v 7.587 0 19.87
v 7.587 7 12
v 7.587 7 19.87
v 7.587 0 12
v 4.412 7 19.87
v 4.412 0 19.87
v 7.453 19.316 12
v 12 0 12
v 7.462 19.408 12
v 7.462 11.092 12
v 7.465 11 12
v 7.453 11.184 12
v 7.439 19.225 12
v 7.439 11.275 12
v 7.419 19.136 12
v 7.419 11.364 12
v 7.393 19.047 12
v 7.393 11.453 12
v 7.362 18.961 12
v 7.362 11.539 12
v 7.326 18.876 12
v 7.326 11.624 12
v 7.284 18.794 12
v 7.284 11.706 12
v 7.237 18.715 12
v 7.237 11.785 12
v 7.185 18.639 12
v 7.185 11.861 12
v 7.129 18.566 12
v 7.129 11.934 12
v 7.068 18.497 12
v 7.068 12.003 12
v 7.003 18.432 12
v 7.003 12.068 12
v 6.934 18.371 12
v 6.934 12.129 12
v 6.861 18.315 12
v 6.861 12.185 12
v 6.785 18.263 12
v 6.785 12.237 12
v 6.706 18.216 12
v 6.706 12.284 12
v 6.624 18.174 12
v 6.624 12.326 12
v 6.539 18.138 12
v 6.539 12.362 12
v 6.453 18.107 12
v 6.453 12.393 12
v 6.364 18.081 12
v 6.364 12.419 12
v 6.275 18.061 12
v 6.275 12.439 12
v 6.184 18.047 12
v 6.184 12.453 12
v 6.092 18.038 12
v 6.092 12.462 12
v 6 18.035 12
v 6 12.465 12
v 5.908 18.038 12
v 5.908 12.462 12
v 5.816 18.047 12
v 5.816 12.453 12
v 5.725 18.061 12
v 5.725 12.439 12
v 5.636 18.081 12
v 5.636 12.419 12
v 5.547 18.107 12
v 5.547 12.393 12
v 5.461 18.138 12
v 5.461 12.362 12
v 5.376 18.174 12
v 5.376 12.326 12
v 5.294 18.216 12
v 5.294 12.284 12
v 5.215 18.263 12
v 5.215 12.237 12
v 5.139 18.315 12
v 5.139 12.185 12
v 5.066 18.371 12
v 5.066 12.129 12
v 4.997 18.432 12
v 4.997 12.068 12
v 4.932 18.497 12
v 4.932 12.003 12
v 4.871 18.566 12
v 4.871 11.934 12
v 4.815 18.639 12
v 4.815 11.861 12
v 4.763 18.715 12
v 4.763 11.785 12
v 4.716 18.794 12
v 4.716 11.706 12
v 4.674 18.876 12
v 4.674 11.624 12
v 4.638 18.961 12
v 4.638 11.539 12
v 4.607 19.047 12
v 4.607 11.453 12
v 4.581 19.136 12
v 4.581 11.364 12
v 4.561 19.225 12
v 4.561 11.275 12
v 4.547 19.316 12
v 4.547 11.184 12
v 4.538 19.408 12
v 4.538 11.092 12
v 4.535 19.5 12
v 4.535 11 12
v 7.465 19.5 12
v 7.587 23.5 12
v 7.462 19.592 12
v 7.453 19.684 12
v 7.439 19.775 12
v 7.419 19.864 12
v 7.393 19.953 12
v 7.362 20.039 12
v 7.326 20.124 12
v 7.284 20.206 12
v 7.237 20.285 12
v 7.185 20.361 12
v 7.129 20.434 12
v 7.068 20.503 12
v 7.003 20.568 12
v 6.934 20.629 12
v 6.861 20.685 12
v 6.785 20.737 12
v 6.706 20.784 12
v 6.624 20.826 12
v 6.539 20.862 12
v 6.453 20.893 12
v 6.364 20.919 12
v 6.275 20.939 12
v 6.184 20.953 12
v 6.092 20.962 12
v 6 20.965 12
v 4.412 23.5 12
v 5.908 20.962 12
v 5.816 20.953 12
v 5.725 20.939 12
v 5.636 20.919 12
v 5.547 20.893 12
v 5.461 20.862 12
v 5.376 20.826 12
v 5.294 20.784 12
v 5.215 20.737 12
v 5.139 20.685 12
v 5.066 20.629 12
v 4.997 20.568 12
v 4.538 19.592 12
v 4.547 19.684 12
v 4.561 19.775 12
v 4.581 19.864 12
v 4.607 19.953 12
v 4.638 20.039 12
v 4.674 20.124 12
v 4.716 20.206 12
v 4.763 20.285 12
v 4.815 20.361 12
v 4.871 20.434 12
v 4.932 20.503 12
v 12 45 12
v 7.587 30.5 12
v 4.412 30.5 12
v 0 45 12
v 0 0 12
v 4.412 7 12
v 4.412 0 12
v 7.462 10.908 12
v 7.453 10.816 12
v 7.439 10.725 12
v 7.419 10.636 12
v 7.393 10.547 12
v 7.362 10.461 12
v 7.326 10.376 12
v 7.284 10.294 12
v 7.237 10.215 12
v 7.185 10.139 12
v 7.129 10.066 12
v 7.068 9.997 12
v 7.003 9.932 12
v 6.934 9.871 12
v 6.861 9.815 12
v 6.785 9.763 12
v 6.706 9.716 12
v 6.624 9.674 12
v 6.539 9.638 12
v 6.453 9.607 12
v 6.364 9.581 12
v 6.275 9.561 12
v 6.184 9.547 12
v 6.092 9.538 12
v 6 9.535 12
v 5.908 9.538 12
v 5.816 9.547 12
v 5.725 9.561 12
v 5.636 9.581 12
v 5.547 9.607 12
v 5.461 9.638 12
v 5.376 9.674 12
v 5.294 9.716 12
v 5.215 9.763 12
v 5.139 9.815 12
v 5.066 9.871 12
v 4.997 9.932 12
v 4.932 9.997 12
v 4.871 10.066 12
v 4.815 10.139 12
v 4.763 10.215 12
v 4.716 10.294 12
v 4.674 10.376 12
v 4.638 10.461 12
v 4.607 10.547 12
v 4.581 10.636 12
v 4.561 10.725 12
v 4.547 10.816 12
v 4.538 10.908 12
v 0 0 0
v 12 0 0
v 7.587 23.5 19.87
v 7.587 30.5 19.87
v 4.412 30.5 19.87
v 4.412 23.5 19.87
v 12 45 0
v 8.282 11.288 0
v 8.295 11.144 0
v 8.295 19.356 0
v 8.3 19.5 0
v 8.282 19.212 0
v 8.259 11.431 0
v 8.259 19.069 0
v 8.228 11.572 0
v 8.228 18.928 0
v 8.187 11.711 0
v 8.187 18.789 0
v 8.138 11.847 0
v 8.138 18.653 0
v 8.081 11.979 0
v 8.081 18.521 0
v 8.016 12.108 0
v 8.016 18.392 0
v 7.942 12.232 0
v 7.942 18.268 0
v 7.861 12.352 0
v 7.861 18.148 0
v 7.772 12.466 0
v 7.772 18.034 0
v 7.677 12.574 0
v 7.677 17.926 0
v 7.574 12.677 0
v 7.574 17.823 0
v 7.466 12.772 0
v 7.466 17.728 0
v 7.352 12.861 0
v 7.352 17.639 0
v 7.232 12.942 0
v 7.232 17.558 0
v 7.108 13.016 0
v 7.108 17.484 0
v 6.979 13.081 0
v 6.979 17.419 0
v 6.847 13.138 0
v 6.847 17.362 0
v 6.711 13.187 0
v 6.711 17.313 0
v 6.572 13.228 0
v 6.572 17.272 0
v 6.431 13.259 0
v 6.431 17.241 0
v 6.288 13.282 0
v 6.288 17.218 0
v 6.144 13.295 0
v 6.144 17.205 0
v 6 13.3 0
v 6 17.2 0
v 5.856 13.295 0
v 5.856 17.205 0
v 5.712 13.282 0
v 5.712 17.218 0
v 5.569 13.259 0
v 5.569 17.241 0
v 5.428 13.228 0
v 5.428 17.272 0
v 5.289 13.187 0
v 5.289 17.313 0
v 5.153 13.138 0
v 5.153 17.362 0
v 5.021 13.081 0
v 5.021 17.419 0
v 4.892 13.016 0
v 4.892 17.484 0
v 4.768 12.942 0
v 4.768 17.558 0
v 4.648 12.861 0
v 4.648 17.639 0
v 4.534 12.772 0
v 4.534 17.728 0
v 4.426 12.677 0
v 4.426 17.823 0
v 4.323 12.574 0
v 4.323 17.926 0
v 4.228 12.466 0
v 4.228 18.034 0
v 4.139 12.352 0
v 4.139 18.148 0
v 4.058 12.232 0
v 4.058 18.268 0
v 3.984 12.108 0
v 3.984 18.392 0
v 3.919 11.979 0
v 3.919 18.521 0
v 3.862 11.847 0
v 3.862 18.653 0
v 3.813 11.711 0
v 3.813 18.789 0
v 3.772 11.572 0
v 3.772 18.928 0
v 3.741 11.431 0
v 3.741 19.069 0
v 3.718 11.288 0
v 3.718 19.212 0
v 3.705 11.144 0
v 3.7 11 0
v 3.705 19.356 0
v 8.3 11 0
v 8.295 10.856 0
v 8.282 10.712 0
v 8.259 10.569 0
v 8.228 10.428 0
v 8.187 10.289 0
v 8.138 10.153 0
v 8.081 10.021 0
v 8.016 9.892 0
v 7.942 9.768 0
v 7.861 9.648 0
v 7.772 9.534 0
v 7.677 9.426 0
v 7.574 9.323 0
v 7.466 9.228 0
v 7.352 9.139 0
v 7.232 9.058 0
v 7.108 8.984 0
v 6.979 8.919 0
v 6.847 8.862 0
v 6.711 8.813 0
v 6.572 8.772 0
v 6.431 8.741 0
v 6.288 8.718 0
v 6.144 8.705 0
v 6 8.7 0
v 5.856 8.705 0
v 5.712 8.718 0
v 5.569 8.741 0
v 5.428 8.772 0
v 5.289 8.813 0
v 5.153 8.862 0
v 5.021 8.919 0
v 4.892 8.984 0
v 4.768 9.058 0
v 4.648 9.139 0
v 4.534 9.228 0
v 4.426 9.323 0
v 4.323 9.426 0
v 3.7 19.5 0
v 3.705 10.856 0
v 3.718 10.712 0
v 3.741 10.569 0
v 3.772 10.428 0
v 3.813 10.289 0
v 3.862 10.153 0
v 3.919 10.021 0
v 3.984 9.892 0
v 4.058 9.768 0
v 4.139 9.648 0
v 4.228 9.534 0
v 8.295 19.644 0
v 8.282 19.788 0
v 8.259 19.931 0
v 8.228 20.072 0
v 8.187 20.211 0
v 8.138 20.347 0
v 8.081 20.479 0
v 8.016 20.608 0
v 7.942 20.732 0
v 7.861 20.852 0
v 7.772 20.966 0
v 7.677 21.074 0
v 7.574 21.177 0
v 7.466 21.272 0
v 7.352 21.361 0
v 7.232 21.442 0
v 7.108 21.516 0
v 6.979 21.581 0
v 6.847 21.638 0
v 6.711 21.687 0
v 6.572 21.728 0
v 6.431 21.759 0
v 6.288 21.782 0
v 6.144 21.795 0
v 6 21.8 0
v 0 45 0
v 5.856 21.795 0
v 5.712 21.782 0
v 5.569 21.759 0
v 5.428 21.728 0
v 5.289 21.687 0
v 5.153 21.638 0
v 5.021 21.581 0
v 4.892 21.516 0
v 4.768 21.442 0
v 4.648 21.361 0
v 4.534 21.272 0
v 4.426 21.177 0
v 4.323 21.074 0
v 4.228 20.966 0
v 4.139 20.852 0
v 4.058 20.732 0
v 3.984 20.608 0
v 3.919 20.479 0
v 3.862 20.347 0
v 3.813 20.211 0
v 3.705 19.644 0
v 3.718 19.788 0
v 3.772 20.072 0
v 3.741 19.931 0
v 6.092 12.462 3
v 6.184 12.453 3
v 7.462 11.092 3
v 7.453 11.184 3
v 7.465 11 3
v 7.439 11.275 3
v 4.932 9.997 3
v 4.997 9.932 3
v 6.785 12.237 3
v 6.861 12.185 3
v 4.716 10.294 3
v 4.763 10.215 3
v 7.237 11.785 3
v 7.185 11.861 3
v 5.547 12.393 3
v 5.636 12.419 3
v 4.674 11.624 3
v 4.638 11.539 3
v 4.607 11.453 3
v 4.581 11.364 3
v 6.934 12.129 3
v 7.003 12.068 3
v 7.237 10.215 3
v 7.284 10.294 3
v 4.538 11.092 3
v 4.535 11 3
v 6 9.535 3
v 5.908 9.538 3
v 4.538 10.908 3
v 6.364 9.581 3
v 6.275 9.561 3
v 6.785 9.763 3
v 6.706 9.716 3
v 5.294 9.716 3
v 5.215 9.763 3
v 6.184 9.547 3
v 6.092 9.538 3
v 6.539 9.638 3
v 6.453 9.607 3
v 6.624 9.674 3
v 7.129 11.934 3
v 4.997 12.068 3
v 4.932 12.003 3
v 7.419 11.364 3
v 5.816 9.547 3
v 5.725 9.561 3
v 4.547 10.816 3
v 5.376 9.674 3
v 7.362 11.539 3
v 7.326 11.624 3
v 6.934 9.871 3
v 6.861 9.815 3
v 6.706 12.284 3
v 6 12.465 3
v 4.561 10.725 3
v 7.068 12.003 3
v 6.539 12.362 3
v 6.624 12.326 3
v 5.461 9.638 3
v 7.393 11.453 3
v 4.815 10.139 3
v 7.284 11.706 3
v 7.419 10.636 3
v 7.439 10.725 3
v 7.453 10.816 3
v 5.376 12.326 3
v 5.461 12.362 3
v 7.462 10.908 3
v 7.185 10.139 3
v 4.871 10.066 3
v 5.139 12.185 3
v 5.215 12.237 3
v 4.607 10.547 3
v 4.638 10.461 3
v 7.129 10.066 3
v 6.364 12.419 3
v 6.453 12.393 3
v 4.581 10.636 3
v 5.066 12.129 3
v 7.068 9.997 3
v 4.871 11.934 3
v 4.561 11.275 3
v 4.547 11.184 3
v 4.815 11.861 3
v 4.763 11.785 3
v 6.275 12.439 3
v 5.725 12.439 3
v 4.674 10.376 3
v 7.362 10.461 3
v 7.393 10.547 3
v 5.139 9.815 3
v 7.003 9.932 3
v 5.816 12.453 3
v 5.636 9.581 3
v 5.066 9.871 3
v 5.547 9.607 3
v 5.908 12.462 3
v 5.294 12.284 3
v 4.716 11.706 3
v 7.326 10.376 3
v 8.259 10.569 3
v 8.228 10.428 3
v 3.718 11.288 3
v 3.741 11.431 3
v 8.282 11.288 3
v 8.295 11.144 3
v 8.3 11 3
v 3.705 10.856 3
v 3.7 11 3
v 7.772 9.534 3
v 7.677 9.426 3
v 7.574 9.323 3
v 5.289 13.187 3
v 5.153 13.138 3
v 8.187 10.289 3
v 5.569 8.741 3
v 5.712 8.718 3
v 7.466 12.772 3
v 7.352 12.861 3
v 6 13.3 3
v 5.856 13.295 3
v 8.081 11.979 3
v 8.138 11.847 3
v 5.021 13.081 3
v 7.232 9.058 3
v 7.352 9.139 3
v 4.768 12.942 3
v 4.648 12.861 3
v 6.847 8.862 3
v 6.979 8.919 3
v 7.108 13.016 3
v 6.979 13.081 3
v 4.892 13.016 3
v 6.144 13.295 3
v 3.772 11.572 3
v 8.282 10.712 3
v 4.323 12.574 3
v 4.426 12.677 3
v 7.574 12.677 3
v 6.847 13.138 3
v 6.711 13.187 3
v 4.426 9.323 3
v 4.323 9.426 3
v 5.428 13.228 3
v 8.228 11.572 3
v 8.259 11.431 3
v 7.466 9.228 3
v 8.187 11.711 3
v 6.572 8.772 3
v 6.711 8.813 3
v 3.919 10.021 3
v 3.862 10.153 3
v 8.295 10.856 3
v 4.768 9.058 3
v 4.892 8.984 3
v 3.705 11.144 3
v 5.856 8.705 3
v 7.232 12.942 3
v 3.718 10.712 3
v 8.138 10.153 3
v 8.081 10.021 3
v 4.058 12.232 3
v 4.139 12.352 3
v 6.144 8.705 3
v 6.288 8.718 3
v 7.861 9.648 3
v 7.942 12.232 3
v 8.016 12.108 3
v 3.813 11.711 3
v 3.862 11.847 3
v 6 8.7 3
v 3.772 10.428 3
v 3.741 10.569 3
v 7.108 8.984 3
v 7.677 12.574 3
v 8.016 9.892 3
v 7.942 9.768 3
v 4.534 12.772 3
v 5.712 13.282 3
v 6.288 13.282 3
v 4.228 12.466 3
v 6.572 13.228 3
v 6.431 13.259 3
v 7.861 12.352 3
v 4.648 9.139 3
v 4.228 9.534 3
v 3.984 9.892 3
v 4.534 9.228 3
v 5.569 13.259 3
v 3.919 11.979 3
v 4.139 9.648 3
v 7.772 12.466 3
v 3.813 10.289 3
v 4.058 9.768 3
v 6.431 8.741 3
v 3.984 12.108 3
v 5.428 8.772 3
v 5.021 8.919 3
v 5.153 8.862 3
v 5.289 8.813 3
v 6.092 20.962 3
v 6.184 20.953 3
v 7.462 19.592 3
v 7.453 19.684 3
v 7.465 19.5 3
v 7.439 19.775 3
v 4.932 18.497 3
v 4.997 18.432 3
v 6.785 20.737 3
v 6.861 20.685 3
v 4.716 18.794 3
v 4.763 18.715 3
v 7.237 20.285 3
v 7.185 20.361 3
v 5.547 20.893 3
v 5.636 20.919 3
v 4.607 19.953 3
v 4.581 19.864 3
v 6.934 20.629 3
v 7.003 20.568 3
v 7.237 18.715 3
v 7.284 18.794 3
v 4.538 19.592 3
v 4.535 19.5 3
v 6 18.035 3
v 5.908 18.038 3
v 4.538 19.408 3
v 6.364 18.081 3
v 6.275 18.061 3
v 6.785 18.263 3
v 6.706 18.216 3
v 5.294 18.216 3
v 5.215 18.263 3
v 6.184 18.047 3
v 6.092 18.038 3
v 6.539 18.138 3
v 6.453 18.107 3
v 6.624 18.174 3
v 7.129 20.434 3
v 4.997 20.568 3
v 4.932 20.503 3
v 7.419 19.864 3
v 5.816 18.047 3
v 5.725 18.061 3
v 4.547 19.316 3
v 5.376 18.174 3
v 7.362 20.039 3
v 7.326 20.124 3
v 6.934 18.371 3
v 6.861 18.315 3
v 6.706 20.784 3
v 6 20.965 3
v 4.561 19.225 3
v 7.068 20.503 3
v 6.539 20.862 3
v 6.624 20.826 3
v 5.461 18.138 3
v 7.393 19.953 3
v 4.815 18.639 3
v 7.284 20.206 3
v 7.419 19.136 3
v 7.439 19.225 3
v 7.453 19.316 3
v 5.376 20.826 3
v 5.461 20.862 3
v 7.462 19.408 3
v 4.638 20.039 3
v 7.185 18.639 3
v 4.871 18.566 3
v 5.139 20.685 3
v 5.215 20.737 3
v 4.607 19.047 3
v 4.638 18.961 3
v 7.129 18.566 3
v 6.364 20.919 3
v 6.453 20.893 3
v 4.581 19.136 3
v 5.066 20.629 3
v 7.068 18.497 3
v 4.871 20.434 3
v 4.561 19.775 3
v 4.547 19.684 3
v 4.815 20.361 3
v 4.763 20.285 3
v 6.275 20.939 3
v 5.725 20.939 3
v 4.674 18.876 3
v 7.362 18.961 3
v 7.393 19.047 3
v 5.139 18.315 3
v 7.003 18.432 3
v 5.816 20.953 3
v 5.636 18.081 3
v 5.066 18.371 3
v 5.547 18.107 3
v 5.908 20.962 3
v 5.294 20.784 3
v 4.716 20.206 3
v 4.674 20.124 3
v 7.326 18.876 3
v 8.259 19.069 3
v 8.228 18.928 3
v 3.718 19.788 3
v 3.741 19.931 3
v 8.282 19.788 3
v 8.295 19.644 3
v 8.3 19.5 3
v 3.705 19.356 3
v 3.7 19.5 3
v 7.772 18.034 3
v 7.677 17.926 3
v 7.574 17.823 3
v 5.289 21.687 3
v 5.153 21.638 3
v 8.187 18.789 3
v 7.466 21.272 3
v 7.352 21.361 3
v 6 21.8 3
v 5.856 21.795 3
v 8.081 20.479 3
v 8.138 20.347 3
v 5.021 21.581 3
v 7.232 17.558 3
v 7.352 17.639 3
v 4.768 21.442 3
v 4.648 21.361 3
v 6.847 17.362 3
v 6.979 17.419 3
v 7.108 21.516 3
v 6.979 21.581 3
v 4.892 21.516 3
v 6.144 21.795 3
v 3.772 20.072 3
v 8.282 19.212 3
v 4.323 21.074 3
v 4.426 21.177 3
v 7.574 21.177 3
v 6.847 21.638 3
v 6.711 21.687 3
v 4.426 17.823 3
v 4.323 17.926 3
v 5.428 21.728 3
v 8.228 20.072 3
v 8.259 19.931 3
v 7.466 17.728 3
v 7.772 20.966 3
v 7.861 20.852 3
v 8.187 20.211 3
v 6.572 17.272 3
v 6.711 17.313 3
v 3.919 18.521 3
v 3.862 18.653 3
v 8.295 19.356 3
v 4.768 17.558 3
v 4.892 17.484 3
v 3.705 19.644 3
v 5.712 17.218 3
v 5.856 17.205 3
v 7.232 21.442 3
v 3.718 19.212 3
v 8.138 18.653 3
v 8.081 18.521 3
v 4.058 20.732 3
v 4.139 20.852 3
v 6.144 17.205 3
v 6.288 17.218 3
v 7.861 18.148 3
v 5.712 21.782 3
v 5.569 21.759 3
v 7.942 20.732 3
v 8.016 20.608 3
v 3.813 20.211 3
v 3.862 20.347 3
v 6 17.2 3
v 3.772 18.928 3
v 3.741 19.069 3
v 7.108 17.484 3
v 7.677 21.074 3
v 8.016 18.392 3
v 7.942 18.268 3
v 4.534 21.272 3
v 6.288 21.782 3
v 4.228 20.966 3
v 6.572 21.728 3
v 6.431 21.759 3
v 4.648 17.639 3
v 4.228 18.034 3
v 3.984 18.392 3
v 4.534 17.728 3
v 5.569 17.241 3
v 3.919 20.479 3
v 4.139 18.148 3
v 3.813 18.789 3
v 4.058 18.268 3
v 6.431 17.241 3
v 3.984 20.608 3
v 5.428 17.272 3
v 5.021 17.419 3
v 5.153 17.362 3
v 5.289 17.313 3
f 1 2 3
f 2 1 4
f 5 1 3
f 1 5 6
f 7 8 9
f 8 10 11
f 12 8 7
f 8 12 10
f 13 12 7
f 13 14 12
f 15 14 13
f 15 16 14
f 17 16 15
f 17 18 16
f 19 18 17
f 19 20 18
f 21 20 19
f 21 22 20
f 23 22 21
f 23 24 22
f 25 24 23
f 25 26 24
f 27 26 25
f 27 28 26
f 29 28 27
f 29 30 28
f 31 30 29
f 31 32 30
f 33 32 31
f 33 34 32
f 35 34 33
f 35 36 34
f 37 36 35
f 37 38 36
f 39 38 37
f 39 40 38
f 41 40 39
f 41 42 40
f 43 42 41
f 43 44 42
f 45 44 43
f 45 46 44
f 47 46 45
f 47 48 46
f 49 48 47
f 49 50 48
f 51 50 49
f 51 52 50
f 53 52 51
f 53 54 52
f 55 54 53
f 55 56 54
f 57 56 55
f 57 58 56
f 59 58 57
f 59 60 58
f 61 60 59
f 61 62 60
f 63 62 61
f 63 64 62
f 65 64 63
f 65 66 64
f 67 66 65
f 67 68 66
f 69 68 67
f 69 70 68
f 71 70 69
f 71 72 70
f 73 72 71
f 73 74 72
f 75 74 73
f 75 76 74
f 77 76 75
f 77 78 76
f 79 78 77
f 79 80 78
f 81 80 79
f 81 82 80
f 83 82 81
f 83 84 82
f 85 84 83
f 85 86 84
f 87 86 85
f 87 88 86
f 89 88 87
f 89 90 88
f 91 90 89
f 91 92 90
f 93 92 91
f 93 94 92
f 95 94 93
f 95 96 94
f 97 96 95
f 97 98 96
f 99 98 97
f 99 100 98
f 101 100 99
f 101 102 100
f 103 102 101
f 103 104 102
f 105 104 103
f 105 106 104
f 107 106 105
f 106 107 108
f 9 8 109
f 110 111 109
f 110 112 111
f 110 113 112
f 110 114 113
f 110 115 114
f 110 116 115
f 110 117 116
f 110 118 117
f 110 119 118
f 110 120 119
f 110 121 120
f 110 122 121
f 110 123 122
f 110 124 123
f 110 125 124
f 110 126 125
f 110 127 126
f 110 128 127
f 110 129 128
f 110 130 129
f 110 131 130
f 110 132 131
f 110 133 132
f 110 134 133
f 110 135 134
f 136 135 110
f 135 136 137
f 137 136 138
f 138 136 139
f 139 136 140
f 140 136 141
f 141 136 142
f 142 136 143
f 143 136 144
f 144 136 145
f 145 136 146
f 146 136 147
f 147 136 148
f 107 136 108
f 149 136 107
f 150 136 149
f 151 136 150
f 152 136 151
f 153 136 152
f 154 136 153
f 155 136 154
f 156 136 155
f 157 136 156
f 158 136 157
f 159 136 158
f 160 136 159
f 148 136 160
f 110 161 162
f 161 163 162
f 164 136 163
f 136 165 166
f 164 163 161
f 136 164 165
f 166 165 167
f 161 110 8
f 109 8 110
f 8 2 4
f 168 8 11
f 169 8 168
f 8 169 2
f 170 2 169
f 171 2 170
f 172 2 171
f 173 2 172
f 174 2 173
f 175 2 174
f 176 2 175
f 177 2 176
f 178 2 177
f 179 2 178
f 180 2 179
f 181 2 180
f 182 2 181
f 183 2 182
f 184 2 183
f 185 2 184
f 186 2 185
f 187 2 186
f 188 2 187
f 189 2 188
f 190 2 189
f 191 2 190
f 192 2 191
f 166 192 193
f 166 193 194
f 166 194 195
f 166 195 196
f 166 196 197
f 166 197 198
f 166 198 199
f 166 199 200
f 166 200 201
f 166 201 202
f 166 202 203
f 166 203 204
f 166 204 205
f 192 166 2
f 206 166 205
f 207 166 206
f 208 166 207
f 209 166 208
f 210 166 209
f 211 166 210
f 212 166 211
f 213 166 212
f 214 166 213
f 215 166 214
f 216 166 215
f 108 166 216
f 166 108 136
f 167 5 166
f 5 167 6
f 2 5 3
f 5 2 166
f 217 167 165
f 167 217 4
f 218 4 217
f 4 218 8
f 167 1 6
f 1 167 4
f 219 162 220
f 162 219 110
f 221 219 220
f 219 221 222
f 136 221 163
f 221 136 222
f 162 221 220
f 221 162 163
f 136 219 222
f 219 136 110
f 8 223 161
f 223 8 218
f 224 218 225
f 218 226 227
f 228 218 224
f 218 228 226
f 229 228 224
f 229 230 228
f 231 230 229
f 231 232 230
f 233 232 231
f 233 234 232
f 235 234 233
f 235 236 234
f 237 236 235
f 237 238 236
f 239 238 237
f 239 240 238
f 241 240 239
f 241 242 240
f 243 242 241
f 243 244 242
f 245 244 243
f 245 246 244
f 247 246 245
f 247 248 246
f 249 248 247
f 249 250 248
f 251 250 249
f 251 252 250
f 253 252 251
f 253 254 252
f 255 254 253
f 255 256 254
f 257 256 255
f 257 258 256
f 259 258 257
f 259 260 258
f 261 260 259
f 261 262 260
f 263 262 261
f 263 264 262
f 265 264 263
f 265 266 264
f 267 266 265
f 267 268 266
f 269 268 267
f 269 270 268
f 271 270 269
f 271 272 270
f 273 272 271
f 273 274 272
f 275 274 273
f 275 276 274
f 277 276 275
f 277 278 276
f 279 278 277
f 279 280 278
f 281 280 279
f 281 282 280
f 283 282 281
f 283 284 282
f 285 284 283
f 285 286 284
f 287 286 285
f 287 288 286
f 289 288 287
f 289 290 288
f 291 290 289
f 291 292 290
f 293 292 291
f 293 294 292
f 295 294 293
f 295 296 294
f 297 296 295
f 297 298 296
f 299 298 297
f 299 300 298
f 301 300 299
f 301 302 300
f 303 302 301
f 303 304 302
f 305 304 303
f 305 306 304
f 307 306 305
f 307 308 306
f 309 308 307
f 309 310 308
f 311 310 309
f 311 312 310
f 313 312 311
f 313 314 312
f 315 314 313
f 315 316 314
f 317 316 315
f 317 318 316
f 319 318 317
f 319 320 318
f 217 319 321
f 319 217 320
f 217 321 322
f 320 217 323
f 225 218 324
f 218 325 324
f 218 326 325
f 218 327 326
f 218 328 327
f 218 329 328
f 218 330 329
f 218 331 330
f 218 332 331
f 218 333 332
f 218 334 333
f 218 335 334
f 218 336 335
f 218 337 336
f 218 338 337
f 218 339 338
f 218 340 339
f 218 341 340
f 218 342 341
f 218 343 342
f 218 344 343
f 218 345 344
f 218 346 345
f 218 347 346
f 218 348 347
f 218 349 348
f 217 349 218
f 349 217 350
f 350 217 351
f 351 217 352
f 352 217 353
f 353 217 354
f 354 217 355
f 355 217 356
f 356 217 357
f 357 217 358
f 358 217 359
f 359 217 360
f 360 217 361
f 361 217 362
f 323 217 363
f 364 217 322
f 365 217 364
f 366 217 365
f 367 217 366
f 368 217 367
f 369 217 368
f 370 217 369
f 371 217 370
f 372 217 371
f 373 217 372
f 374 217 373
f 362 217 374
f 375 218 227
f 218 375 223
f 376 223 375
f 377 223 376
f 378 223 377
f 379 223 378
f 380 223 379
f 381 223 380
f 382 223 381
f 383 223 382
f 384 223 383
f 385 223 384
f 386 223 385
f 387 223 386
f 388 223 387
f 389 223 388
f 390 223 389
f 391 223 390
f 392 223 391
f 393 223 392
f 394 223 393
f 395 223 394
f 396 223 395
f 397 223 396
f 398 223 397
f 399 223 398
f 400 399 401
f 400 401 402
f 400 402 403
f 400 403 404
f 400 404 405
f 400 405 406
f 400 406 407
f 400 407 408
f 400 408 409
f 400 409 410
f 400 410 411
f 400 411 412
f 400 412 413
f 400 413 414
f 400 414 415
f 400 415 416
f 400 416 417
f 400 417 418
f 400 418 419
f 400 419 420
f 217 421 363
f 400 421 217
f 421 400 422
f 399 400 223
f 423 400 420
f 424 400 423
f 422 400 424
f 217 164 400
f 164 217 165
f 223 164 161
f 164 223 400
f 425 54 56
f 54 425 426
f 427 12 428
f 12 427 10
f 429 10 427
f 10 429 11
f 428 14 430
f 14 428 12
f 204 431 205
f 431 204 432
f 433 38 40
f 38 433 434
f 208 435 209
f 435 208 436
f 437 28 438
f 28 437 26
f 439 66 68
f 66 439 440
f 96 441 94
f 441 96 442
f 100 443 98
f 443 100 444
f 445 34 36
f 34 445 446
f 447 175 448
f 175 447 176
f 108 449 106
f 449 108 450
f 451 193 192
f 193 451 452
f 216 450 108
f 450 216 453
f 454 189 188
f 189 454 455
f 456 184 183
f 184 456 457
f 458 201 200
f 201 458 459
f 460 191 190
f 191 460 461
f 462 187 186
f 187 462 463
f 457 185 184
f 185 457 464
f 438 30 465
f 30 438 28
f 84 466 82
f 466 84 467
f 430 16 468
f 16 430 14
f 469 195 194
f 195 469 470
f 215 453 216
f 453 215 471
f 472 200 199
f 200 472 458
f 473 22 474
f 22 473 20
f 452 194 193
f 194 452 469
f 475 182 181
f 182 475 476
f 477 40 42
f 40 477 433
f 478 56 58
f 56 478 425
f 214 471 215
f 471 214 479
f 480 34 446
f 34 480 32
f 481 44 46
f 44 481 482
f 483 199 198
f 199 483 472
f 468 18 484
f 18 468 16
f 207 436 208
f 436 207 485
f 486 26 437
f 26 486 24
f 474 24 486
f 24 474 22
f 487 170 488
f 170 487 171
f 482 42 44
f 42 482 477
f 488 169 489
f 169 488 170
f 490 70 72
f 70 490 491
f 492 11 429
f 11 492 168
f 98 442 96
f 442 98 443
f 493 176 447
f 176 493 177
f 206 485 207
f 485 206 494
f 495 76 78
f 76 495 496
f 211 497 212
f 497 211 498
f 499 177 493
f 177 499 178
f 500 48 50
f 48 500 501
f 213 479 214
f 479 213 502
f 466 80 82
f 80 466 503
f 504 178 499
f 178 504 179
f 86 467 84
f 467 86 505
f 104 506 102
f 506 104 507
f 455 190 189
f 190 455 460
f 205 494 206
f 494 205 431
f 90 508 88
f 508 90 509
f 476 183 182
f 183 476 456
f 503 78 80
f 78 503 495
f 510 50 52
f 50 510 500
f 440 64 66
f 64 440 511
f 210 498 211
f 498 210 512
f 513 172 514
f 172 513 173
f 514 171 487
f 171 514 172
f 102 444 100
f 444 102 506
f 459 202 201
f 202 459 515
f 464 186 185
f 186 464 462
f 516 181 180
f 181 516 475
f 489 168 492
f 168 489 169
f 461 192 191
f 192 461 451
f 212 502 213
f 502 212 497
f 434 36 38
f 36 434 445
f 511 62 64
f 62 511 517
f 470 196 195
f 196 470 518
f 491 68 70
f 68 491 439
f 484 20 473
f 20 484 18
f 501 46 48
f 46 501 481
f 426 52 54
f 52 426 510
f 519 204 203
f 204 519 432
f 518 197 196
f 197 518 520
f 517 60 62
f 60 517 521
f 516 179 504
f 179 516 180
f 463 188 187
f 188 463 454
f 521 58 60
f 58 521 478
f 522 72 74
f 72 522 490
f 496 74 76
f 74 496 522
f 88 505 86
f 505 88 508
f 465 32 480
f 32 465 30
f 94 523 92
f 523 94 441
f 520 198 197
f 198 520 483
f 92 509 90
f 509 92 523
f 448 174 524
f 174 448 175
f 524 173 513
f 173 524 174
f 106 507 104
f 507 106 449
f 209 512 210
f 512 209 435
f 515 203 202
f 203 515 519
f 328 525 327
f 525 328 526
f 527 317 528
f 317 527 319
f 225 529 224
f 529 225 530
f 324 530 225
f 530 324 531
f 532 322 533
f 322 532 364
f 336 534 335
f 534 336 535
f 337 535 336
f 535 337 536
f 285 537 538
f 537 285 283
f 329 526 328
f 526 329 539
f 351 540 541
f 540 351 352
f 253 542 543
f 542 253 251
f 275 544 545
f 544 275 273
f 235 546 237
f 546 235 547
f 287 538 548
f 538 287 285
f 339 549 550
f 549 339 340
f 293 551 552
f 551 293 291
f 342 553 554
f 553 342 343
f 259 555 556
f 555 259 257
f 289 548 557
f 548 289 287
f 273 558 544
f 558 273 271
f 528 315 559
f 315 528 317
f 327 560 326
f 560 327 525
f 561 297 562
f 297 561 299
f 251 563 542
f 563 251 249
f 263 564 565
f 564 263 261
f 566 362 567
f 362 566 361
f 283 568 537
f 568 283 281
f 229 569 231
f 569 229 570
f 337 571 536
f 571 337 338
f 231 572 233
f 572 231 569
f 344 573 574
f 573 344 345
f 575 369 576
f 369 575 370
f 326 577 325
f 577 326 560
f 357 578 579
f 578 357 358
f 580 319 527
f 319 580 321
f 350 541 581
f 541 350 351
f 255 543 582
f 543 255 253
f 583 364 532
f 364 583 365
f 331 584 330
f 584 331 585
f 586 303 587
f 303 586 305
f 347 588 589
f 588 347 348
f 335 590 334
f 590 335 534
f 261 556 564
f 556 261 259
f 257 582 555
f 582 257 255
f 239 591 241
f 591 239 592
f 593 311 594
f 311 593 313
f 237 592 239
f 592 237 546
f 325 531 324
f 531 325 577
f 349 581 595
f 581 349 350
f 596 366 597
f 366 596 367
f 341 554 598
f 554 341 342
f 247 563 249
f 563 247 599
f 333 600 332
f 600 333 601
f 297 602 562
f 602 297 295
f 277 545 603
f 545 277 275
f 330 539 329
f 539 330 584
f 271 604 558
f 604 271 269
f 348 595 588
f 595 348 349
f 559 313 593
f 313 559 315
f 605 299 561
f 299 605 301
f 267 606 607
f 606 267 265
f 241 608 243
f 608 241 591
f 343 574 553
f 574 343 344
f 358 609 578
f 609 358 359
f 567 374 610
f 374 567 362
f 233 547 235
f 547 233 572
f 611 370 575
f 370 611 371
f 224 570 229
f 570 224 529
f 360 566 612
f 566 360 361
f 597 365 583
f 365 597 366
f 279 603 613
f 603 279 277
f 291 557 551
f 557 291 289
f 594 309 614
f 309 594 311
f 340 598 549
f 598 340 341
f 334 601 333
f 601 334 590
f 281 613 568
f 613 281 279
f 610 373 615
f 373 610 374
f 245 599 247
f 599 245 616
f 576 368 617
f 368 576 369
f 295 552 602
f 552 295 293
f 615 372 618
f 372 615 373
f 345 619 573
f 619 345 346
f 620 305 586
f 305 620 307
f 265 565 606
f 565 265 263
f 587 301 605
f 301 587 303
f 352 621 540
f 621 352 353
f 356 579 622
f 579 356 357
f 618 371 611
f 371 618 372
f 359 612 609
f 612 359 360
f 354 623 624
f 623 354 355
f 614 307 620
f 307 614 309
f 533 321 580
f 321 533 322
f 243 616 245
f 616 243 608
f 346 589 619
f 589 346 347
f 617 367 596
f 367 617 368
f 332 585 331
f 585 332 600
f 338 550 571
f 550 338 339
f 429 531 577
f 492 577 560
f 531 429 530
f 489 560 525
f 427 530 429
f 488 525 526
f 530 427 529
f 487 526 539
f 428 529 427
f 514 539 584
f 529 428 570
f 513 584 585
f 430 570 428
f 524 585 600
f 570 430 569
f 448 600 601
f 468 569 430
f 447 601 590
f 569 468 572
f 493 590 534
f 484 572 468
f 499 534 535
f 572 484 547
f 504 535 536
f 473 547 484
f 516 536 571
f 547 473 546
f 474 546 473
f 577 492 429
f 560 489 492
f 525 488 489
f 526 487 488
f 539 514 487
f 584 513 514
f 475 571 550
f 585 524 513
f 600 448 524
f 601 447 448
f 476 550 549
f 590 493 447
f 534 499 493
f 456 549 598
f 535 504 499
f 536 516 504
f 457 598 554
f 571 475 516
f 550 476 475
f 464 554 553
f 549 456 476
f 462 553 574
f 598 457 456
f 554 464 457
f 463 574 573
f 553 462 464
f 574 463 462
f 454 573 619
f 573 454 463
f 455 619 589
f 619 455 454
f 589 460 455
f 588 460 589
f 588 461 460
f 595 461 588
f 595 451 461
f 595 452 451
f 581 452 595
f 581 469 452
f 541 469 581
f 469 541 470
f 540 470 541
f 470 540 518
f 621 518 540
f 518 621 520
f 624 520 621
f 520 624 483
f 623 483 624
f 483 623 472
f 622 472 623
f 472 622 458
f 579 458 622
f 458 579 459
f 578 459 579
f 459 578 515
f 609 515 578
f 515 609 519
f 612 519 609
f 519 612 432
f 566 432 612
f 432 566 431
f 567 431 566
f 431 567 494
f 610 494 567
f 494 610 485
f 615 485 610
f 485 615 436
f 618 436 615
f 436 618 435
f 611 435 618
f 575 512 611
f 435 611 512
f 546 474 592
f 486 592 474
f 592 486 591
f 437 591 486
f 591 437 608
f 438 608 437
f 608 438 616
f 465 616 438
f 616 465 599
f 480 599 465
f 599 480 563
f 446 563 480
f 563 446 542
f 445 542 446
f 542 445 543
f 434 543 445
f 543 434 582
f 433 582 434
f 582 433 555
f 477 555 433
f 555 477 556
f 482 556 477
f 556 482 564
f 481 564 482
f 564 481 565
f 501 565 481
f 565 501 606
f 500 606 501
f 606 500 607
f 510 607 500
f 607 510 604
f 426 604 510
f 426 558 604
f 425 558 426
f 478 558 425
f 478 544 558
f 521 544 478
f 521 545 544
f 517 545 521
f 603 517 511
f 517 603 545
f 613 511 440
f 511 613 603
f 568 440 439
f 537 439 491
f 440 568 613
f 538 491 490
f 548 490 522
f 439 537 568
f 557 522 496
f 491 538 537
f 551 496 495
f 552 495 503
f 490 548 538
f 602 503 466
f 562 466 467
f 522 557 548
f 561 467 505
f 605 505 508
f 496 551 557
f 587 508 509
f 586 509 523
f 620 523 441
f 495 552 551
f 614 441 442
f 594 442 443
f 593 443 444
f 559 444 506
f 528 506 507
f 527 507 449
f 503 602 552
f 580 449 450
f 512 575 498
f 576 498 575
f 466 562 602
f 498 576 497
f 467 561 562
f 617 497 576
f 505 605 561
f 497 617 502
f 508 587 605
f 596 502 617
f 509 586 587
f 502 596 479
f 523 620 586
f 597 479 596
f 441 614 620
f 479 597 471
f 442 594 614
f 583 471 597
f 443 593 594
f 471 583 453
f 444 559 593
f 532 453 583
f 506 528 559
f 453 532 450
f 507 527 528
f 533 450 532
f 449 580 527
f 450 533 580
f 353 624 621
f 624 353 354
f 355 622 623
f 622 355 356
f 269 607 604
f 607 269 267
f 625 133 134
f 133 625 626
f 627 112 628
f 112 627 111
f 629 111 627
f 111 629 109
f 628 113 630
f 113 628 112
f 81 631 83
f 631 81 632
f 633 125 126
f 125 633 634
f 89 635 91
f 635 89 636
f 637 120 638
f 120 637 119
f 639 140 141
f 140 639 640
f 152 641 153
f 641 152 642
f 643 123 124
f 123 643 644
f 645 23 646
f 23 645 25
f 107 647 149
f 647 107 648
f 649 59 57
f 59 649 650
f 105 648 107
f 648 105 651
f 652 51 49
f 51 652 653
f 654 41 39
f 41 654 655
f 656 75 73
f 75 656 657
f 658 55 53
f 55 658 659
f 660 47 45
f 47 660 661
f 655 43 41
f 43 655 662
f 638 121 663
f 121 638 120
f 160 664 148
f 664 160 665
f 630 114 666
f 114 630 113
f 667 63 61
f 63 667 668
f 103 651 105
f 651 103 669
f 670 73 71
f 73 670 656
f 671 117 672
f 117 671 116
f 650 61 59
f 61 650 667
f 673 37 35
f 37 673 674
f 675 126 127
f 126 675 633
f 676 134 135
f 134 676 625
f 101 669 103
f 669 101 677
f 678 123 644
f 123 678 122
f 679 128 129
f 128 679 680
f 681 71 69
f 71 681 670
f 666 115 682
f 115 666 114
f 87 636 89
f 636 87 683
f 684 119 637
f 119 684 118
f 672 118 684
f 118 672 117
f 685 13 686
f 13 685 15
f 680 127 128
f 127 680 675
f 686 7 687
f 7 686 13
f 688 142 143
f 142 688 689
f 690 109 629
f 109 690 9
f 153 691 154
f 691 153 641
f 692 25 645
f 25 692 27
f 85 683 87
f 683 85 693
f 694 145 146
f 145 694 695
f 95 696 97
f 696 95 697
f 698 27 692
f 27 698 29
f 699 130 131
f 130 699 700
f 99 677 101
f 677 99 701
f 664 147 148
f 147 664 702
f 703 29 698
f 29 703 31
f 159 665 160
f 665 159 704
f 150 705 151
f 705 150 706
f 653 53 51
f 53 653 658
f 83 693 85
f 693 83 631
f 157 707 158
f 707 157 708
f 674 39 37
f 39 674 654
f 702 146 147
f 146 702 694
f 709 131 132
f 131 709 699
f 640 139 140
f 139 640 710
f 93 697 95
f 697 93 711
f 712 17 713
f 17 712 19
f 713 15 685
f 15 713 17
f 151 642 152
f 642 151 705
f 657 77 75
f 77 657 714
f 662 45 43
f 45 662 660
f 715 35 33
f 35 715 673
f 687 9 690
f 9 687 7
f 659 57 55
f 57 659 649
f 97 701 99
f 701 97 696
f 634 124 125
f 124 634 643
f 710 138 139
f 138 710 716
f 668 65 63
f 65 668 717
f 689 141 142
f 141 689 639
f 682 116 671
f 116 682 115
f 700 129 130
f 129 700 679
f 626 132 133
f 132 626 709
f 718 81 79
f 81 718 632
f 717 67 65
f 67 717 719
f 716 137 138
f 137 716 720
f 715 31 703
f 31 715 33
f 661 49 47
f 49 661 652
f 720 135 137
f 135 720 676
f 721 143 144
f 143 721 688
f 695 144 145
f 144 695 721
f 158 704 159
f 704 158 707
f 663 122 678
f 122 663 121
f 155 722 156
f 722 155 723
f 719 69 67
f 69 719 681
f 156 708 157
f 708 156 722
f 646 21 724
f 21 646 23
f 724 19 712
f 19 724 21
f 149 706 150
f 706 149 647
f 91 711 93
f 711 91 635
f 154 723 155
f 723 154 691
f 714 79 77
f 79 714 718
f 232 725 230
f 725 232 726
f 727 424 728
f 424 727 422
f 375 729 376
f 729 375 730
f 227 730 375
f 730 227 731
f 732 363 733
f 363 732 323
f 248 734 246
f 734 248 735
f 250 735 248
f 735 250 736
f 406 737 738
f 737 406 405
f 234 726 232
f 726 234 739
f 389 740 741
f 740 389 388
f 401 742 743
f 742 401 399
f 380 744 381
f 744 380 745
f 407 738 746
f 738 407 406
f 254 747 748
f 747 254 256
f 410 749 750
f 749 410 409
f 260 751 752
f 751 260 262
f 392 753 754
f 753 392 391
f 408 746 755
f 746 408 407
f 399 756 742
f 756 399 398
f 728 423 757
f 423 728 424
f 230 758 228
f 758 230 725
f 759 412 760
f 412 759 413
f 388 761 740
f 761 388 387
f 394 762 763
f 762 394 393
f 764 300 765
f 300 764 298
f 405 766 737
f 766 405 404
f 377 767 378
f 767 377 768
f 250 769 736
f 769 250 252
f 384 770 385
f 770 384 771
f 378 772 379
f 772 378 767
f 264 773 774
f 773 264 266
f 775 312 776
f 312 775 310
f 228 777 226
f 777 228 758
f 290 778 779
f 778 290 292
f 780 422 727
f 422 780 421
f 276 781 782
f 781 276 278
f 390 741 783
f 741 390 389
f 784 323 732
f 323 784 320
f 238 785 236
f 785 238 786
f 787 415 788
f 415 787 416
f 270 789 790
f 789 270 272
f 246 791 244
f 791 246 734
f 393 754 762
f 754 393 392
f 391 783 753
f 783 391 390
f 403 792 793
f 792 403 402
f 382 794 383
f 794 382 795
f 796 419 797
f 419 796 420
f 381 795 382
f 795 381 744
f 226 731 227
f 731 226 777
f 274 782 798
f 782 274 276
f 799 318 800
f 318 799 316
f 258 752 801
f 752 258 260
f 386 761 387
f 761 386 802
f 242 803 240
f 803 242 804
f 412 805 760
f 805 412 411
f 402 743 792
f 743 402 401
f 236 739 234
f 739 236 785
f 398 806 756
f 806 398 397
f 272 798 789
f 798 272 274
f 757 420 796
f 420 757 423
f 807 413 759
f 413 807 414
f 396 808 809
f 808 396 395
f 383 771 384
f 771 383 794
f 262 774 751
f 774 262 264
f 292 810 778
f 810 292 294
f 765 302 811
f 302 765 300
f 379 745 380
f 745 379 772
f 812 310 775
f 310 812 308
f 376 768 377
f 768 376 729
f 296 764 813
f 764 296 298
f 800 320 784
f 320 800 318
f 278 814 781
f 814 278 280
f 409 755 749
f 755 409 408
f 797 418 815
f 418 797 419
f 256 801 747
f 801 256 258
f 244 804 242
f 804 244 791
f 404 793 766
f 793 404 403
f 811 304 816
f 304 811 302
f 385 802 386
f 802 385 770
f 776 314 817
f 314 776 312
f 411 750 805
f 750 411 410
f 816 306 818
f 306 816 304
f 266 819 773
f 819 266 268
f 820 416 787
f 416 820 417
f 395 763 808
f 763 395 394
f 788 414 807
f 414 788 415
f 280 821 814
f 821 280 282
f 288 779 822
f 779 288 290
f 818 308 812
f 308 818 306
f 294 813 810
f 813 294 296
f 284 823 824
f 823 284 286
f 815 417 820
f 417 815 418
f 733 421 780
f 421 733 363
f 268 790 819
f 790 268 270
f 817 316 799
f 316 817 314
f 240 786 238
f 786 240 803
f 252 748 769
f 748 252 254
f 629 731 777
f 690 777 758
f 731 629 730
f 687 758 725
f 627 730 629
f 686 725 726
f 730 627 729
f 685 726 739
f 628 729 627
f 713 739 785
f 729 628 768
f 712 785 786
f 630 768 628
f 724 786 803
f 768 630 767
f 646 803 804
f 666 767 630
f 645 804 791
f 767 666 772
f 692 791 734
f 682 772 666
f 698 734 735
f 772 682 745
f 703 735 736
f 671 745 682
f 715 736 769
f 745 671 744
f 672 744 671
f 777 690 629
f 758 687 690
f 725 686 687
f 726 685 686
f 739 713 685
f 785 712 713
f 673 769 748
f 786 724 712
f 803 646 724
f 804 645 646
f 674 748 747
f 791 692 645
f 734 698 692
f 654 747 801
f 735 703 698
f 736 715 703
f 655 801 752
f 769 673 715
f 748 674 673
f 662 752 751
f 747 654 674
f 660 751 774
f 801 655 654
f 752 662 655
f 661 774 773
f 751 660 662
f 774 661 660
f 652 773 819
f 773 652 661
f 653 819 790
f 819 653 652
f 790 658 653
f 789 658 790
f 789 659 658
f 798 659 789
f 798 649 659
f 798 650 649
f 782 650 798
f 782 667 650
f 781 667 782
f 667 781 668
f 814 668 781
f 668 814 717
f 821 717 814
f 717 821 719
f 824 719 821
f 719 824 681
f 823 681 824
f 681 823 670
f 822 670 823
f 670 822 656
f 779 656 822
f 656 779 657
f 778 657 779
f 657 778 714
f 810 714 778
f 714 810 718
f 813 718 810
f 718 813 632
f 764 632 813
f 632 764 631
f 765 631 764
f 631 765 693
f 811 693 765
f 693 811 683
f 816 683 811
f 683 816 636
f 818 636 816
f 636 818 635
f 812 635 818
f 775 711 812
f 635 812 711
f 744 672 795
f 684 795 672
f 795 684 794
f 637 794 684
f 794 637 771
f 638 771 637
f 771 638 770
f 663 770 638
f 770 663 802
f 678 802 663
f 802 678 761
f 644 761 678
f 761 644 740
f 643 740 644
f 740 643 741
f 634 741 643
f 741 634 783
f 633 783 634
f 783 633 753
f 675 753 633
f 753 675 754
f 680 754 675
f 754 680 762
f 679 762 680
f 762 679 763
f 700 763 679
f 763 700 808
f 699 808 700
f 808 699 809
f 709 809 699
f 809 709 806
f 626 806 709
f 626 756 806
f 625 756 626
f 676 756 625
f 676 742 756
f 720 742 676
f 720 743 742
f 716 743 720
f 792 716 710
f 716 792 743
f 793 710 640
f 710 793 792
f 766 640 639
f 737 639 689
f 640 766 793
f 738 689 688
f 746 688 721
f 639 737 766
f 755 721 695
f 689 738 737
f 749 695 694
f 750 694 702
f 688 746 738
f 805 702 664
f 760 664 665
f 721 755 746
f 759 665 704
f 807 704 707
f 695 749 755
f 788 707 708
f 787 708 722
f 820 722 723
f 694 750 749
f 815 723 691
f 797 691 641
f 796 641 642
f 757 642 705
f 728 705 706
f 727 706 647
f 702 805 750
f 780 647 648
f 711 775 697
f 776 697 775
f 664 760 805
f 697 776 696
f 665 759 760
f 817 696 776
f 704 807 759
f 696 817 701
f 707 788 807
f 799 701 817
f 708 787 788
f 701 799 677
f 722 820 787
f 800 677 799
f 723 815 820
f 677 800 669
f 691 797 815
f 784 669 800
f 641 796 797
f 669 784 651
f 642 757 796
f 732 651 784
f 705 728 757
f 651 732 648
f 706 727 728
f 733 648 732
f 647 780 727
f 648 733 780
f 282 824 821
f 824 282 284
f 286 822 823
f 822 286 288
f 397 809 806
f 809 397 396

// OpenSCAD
/*
    Author: Kevin Lutzer
    Date Created: 7th October 2016 
    
    Description: Z axis limit switch support
*/

//////////////////////////////////////// Parameters /////////////////////////////////////////

length = 45;
width = 12;
thickness = 12;

hinge_thickness = 7.87;
hinge_width = 3.175;
hinge_length = 7; 

mount_screw_seperation = 8.50;
mount_screw_width = 2.93;
mount_screw_head_width = 4.60;
mount_screw_head_height = 3;

switch_screw_width = 0.5; 
switch_screw_seperation = 8;
switch_amount = 10;


///////////////////////////////////////// Modules ///////////////////////////////////////////

//////////////////////////////////////// Prototypes /////////////////////////////////////////
difference(){    
    union()
    {
        cube([width, length, thickness], 0);
        for( i = [0 : 8 + mount_screw_seperation + hinge_length : 8 + mount_screw_seperation + hinge_length ] ){
            translate([width/2 - hinge_width/2,i,thickness]){ cube([hinge_width, hinge_length,          hinge_thickness],0); }
            translate([width/2 - hinge_width/2,i,thickness]){ cube([hinge_width, hinge_length,          hinge_thickness],0); }
        }
            
    }
        for( i = [0 : mount_screw_seperation : mount_screw_seperation] ){
            translate([width/2, hinge_length + 4 + i ,0]){
                cylinder(thickness +1, d1 = mount_screw_width, d2 =         mount_screw_width, 0, $fn=100);   
            }
            translate([width/2, hinge_length + 4 + i ,0]){
                cylinder(mount_screw_head_height, d1 = mount_screw_head_width, d2 =         mount_screw_head_width, 0, $fn=100);   
            }
        
        }
         
}
